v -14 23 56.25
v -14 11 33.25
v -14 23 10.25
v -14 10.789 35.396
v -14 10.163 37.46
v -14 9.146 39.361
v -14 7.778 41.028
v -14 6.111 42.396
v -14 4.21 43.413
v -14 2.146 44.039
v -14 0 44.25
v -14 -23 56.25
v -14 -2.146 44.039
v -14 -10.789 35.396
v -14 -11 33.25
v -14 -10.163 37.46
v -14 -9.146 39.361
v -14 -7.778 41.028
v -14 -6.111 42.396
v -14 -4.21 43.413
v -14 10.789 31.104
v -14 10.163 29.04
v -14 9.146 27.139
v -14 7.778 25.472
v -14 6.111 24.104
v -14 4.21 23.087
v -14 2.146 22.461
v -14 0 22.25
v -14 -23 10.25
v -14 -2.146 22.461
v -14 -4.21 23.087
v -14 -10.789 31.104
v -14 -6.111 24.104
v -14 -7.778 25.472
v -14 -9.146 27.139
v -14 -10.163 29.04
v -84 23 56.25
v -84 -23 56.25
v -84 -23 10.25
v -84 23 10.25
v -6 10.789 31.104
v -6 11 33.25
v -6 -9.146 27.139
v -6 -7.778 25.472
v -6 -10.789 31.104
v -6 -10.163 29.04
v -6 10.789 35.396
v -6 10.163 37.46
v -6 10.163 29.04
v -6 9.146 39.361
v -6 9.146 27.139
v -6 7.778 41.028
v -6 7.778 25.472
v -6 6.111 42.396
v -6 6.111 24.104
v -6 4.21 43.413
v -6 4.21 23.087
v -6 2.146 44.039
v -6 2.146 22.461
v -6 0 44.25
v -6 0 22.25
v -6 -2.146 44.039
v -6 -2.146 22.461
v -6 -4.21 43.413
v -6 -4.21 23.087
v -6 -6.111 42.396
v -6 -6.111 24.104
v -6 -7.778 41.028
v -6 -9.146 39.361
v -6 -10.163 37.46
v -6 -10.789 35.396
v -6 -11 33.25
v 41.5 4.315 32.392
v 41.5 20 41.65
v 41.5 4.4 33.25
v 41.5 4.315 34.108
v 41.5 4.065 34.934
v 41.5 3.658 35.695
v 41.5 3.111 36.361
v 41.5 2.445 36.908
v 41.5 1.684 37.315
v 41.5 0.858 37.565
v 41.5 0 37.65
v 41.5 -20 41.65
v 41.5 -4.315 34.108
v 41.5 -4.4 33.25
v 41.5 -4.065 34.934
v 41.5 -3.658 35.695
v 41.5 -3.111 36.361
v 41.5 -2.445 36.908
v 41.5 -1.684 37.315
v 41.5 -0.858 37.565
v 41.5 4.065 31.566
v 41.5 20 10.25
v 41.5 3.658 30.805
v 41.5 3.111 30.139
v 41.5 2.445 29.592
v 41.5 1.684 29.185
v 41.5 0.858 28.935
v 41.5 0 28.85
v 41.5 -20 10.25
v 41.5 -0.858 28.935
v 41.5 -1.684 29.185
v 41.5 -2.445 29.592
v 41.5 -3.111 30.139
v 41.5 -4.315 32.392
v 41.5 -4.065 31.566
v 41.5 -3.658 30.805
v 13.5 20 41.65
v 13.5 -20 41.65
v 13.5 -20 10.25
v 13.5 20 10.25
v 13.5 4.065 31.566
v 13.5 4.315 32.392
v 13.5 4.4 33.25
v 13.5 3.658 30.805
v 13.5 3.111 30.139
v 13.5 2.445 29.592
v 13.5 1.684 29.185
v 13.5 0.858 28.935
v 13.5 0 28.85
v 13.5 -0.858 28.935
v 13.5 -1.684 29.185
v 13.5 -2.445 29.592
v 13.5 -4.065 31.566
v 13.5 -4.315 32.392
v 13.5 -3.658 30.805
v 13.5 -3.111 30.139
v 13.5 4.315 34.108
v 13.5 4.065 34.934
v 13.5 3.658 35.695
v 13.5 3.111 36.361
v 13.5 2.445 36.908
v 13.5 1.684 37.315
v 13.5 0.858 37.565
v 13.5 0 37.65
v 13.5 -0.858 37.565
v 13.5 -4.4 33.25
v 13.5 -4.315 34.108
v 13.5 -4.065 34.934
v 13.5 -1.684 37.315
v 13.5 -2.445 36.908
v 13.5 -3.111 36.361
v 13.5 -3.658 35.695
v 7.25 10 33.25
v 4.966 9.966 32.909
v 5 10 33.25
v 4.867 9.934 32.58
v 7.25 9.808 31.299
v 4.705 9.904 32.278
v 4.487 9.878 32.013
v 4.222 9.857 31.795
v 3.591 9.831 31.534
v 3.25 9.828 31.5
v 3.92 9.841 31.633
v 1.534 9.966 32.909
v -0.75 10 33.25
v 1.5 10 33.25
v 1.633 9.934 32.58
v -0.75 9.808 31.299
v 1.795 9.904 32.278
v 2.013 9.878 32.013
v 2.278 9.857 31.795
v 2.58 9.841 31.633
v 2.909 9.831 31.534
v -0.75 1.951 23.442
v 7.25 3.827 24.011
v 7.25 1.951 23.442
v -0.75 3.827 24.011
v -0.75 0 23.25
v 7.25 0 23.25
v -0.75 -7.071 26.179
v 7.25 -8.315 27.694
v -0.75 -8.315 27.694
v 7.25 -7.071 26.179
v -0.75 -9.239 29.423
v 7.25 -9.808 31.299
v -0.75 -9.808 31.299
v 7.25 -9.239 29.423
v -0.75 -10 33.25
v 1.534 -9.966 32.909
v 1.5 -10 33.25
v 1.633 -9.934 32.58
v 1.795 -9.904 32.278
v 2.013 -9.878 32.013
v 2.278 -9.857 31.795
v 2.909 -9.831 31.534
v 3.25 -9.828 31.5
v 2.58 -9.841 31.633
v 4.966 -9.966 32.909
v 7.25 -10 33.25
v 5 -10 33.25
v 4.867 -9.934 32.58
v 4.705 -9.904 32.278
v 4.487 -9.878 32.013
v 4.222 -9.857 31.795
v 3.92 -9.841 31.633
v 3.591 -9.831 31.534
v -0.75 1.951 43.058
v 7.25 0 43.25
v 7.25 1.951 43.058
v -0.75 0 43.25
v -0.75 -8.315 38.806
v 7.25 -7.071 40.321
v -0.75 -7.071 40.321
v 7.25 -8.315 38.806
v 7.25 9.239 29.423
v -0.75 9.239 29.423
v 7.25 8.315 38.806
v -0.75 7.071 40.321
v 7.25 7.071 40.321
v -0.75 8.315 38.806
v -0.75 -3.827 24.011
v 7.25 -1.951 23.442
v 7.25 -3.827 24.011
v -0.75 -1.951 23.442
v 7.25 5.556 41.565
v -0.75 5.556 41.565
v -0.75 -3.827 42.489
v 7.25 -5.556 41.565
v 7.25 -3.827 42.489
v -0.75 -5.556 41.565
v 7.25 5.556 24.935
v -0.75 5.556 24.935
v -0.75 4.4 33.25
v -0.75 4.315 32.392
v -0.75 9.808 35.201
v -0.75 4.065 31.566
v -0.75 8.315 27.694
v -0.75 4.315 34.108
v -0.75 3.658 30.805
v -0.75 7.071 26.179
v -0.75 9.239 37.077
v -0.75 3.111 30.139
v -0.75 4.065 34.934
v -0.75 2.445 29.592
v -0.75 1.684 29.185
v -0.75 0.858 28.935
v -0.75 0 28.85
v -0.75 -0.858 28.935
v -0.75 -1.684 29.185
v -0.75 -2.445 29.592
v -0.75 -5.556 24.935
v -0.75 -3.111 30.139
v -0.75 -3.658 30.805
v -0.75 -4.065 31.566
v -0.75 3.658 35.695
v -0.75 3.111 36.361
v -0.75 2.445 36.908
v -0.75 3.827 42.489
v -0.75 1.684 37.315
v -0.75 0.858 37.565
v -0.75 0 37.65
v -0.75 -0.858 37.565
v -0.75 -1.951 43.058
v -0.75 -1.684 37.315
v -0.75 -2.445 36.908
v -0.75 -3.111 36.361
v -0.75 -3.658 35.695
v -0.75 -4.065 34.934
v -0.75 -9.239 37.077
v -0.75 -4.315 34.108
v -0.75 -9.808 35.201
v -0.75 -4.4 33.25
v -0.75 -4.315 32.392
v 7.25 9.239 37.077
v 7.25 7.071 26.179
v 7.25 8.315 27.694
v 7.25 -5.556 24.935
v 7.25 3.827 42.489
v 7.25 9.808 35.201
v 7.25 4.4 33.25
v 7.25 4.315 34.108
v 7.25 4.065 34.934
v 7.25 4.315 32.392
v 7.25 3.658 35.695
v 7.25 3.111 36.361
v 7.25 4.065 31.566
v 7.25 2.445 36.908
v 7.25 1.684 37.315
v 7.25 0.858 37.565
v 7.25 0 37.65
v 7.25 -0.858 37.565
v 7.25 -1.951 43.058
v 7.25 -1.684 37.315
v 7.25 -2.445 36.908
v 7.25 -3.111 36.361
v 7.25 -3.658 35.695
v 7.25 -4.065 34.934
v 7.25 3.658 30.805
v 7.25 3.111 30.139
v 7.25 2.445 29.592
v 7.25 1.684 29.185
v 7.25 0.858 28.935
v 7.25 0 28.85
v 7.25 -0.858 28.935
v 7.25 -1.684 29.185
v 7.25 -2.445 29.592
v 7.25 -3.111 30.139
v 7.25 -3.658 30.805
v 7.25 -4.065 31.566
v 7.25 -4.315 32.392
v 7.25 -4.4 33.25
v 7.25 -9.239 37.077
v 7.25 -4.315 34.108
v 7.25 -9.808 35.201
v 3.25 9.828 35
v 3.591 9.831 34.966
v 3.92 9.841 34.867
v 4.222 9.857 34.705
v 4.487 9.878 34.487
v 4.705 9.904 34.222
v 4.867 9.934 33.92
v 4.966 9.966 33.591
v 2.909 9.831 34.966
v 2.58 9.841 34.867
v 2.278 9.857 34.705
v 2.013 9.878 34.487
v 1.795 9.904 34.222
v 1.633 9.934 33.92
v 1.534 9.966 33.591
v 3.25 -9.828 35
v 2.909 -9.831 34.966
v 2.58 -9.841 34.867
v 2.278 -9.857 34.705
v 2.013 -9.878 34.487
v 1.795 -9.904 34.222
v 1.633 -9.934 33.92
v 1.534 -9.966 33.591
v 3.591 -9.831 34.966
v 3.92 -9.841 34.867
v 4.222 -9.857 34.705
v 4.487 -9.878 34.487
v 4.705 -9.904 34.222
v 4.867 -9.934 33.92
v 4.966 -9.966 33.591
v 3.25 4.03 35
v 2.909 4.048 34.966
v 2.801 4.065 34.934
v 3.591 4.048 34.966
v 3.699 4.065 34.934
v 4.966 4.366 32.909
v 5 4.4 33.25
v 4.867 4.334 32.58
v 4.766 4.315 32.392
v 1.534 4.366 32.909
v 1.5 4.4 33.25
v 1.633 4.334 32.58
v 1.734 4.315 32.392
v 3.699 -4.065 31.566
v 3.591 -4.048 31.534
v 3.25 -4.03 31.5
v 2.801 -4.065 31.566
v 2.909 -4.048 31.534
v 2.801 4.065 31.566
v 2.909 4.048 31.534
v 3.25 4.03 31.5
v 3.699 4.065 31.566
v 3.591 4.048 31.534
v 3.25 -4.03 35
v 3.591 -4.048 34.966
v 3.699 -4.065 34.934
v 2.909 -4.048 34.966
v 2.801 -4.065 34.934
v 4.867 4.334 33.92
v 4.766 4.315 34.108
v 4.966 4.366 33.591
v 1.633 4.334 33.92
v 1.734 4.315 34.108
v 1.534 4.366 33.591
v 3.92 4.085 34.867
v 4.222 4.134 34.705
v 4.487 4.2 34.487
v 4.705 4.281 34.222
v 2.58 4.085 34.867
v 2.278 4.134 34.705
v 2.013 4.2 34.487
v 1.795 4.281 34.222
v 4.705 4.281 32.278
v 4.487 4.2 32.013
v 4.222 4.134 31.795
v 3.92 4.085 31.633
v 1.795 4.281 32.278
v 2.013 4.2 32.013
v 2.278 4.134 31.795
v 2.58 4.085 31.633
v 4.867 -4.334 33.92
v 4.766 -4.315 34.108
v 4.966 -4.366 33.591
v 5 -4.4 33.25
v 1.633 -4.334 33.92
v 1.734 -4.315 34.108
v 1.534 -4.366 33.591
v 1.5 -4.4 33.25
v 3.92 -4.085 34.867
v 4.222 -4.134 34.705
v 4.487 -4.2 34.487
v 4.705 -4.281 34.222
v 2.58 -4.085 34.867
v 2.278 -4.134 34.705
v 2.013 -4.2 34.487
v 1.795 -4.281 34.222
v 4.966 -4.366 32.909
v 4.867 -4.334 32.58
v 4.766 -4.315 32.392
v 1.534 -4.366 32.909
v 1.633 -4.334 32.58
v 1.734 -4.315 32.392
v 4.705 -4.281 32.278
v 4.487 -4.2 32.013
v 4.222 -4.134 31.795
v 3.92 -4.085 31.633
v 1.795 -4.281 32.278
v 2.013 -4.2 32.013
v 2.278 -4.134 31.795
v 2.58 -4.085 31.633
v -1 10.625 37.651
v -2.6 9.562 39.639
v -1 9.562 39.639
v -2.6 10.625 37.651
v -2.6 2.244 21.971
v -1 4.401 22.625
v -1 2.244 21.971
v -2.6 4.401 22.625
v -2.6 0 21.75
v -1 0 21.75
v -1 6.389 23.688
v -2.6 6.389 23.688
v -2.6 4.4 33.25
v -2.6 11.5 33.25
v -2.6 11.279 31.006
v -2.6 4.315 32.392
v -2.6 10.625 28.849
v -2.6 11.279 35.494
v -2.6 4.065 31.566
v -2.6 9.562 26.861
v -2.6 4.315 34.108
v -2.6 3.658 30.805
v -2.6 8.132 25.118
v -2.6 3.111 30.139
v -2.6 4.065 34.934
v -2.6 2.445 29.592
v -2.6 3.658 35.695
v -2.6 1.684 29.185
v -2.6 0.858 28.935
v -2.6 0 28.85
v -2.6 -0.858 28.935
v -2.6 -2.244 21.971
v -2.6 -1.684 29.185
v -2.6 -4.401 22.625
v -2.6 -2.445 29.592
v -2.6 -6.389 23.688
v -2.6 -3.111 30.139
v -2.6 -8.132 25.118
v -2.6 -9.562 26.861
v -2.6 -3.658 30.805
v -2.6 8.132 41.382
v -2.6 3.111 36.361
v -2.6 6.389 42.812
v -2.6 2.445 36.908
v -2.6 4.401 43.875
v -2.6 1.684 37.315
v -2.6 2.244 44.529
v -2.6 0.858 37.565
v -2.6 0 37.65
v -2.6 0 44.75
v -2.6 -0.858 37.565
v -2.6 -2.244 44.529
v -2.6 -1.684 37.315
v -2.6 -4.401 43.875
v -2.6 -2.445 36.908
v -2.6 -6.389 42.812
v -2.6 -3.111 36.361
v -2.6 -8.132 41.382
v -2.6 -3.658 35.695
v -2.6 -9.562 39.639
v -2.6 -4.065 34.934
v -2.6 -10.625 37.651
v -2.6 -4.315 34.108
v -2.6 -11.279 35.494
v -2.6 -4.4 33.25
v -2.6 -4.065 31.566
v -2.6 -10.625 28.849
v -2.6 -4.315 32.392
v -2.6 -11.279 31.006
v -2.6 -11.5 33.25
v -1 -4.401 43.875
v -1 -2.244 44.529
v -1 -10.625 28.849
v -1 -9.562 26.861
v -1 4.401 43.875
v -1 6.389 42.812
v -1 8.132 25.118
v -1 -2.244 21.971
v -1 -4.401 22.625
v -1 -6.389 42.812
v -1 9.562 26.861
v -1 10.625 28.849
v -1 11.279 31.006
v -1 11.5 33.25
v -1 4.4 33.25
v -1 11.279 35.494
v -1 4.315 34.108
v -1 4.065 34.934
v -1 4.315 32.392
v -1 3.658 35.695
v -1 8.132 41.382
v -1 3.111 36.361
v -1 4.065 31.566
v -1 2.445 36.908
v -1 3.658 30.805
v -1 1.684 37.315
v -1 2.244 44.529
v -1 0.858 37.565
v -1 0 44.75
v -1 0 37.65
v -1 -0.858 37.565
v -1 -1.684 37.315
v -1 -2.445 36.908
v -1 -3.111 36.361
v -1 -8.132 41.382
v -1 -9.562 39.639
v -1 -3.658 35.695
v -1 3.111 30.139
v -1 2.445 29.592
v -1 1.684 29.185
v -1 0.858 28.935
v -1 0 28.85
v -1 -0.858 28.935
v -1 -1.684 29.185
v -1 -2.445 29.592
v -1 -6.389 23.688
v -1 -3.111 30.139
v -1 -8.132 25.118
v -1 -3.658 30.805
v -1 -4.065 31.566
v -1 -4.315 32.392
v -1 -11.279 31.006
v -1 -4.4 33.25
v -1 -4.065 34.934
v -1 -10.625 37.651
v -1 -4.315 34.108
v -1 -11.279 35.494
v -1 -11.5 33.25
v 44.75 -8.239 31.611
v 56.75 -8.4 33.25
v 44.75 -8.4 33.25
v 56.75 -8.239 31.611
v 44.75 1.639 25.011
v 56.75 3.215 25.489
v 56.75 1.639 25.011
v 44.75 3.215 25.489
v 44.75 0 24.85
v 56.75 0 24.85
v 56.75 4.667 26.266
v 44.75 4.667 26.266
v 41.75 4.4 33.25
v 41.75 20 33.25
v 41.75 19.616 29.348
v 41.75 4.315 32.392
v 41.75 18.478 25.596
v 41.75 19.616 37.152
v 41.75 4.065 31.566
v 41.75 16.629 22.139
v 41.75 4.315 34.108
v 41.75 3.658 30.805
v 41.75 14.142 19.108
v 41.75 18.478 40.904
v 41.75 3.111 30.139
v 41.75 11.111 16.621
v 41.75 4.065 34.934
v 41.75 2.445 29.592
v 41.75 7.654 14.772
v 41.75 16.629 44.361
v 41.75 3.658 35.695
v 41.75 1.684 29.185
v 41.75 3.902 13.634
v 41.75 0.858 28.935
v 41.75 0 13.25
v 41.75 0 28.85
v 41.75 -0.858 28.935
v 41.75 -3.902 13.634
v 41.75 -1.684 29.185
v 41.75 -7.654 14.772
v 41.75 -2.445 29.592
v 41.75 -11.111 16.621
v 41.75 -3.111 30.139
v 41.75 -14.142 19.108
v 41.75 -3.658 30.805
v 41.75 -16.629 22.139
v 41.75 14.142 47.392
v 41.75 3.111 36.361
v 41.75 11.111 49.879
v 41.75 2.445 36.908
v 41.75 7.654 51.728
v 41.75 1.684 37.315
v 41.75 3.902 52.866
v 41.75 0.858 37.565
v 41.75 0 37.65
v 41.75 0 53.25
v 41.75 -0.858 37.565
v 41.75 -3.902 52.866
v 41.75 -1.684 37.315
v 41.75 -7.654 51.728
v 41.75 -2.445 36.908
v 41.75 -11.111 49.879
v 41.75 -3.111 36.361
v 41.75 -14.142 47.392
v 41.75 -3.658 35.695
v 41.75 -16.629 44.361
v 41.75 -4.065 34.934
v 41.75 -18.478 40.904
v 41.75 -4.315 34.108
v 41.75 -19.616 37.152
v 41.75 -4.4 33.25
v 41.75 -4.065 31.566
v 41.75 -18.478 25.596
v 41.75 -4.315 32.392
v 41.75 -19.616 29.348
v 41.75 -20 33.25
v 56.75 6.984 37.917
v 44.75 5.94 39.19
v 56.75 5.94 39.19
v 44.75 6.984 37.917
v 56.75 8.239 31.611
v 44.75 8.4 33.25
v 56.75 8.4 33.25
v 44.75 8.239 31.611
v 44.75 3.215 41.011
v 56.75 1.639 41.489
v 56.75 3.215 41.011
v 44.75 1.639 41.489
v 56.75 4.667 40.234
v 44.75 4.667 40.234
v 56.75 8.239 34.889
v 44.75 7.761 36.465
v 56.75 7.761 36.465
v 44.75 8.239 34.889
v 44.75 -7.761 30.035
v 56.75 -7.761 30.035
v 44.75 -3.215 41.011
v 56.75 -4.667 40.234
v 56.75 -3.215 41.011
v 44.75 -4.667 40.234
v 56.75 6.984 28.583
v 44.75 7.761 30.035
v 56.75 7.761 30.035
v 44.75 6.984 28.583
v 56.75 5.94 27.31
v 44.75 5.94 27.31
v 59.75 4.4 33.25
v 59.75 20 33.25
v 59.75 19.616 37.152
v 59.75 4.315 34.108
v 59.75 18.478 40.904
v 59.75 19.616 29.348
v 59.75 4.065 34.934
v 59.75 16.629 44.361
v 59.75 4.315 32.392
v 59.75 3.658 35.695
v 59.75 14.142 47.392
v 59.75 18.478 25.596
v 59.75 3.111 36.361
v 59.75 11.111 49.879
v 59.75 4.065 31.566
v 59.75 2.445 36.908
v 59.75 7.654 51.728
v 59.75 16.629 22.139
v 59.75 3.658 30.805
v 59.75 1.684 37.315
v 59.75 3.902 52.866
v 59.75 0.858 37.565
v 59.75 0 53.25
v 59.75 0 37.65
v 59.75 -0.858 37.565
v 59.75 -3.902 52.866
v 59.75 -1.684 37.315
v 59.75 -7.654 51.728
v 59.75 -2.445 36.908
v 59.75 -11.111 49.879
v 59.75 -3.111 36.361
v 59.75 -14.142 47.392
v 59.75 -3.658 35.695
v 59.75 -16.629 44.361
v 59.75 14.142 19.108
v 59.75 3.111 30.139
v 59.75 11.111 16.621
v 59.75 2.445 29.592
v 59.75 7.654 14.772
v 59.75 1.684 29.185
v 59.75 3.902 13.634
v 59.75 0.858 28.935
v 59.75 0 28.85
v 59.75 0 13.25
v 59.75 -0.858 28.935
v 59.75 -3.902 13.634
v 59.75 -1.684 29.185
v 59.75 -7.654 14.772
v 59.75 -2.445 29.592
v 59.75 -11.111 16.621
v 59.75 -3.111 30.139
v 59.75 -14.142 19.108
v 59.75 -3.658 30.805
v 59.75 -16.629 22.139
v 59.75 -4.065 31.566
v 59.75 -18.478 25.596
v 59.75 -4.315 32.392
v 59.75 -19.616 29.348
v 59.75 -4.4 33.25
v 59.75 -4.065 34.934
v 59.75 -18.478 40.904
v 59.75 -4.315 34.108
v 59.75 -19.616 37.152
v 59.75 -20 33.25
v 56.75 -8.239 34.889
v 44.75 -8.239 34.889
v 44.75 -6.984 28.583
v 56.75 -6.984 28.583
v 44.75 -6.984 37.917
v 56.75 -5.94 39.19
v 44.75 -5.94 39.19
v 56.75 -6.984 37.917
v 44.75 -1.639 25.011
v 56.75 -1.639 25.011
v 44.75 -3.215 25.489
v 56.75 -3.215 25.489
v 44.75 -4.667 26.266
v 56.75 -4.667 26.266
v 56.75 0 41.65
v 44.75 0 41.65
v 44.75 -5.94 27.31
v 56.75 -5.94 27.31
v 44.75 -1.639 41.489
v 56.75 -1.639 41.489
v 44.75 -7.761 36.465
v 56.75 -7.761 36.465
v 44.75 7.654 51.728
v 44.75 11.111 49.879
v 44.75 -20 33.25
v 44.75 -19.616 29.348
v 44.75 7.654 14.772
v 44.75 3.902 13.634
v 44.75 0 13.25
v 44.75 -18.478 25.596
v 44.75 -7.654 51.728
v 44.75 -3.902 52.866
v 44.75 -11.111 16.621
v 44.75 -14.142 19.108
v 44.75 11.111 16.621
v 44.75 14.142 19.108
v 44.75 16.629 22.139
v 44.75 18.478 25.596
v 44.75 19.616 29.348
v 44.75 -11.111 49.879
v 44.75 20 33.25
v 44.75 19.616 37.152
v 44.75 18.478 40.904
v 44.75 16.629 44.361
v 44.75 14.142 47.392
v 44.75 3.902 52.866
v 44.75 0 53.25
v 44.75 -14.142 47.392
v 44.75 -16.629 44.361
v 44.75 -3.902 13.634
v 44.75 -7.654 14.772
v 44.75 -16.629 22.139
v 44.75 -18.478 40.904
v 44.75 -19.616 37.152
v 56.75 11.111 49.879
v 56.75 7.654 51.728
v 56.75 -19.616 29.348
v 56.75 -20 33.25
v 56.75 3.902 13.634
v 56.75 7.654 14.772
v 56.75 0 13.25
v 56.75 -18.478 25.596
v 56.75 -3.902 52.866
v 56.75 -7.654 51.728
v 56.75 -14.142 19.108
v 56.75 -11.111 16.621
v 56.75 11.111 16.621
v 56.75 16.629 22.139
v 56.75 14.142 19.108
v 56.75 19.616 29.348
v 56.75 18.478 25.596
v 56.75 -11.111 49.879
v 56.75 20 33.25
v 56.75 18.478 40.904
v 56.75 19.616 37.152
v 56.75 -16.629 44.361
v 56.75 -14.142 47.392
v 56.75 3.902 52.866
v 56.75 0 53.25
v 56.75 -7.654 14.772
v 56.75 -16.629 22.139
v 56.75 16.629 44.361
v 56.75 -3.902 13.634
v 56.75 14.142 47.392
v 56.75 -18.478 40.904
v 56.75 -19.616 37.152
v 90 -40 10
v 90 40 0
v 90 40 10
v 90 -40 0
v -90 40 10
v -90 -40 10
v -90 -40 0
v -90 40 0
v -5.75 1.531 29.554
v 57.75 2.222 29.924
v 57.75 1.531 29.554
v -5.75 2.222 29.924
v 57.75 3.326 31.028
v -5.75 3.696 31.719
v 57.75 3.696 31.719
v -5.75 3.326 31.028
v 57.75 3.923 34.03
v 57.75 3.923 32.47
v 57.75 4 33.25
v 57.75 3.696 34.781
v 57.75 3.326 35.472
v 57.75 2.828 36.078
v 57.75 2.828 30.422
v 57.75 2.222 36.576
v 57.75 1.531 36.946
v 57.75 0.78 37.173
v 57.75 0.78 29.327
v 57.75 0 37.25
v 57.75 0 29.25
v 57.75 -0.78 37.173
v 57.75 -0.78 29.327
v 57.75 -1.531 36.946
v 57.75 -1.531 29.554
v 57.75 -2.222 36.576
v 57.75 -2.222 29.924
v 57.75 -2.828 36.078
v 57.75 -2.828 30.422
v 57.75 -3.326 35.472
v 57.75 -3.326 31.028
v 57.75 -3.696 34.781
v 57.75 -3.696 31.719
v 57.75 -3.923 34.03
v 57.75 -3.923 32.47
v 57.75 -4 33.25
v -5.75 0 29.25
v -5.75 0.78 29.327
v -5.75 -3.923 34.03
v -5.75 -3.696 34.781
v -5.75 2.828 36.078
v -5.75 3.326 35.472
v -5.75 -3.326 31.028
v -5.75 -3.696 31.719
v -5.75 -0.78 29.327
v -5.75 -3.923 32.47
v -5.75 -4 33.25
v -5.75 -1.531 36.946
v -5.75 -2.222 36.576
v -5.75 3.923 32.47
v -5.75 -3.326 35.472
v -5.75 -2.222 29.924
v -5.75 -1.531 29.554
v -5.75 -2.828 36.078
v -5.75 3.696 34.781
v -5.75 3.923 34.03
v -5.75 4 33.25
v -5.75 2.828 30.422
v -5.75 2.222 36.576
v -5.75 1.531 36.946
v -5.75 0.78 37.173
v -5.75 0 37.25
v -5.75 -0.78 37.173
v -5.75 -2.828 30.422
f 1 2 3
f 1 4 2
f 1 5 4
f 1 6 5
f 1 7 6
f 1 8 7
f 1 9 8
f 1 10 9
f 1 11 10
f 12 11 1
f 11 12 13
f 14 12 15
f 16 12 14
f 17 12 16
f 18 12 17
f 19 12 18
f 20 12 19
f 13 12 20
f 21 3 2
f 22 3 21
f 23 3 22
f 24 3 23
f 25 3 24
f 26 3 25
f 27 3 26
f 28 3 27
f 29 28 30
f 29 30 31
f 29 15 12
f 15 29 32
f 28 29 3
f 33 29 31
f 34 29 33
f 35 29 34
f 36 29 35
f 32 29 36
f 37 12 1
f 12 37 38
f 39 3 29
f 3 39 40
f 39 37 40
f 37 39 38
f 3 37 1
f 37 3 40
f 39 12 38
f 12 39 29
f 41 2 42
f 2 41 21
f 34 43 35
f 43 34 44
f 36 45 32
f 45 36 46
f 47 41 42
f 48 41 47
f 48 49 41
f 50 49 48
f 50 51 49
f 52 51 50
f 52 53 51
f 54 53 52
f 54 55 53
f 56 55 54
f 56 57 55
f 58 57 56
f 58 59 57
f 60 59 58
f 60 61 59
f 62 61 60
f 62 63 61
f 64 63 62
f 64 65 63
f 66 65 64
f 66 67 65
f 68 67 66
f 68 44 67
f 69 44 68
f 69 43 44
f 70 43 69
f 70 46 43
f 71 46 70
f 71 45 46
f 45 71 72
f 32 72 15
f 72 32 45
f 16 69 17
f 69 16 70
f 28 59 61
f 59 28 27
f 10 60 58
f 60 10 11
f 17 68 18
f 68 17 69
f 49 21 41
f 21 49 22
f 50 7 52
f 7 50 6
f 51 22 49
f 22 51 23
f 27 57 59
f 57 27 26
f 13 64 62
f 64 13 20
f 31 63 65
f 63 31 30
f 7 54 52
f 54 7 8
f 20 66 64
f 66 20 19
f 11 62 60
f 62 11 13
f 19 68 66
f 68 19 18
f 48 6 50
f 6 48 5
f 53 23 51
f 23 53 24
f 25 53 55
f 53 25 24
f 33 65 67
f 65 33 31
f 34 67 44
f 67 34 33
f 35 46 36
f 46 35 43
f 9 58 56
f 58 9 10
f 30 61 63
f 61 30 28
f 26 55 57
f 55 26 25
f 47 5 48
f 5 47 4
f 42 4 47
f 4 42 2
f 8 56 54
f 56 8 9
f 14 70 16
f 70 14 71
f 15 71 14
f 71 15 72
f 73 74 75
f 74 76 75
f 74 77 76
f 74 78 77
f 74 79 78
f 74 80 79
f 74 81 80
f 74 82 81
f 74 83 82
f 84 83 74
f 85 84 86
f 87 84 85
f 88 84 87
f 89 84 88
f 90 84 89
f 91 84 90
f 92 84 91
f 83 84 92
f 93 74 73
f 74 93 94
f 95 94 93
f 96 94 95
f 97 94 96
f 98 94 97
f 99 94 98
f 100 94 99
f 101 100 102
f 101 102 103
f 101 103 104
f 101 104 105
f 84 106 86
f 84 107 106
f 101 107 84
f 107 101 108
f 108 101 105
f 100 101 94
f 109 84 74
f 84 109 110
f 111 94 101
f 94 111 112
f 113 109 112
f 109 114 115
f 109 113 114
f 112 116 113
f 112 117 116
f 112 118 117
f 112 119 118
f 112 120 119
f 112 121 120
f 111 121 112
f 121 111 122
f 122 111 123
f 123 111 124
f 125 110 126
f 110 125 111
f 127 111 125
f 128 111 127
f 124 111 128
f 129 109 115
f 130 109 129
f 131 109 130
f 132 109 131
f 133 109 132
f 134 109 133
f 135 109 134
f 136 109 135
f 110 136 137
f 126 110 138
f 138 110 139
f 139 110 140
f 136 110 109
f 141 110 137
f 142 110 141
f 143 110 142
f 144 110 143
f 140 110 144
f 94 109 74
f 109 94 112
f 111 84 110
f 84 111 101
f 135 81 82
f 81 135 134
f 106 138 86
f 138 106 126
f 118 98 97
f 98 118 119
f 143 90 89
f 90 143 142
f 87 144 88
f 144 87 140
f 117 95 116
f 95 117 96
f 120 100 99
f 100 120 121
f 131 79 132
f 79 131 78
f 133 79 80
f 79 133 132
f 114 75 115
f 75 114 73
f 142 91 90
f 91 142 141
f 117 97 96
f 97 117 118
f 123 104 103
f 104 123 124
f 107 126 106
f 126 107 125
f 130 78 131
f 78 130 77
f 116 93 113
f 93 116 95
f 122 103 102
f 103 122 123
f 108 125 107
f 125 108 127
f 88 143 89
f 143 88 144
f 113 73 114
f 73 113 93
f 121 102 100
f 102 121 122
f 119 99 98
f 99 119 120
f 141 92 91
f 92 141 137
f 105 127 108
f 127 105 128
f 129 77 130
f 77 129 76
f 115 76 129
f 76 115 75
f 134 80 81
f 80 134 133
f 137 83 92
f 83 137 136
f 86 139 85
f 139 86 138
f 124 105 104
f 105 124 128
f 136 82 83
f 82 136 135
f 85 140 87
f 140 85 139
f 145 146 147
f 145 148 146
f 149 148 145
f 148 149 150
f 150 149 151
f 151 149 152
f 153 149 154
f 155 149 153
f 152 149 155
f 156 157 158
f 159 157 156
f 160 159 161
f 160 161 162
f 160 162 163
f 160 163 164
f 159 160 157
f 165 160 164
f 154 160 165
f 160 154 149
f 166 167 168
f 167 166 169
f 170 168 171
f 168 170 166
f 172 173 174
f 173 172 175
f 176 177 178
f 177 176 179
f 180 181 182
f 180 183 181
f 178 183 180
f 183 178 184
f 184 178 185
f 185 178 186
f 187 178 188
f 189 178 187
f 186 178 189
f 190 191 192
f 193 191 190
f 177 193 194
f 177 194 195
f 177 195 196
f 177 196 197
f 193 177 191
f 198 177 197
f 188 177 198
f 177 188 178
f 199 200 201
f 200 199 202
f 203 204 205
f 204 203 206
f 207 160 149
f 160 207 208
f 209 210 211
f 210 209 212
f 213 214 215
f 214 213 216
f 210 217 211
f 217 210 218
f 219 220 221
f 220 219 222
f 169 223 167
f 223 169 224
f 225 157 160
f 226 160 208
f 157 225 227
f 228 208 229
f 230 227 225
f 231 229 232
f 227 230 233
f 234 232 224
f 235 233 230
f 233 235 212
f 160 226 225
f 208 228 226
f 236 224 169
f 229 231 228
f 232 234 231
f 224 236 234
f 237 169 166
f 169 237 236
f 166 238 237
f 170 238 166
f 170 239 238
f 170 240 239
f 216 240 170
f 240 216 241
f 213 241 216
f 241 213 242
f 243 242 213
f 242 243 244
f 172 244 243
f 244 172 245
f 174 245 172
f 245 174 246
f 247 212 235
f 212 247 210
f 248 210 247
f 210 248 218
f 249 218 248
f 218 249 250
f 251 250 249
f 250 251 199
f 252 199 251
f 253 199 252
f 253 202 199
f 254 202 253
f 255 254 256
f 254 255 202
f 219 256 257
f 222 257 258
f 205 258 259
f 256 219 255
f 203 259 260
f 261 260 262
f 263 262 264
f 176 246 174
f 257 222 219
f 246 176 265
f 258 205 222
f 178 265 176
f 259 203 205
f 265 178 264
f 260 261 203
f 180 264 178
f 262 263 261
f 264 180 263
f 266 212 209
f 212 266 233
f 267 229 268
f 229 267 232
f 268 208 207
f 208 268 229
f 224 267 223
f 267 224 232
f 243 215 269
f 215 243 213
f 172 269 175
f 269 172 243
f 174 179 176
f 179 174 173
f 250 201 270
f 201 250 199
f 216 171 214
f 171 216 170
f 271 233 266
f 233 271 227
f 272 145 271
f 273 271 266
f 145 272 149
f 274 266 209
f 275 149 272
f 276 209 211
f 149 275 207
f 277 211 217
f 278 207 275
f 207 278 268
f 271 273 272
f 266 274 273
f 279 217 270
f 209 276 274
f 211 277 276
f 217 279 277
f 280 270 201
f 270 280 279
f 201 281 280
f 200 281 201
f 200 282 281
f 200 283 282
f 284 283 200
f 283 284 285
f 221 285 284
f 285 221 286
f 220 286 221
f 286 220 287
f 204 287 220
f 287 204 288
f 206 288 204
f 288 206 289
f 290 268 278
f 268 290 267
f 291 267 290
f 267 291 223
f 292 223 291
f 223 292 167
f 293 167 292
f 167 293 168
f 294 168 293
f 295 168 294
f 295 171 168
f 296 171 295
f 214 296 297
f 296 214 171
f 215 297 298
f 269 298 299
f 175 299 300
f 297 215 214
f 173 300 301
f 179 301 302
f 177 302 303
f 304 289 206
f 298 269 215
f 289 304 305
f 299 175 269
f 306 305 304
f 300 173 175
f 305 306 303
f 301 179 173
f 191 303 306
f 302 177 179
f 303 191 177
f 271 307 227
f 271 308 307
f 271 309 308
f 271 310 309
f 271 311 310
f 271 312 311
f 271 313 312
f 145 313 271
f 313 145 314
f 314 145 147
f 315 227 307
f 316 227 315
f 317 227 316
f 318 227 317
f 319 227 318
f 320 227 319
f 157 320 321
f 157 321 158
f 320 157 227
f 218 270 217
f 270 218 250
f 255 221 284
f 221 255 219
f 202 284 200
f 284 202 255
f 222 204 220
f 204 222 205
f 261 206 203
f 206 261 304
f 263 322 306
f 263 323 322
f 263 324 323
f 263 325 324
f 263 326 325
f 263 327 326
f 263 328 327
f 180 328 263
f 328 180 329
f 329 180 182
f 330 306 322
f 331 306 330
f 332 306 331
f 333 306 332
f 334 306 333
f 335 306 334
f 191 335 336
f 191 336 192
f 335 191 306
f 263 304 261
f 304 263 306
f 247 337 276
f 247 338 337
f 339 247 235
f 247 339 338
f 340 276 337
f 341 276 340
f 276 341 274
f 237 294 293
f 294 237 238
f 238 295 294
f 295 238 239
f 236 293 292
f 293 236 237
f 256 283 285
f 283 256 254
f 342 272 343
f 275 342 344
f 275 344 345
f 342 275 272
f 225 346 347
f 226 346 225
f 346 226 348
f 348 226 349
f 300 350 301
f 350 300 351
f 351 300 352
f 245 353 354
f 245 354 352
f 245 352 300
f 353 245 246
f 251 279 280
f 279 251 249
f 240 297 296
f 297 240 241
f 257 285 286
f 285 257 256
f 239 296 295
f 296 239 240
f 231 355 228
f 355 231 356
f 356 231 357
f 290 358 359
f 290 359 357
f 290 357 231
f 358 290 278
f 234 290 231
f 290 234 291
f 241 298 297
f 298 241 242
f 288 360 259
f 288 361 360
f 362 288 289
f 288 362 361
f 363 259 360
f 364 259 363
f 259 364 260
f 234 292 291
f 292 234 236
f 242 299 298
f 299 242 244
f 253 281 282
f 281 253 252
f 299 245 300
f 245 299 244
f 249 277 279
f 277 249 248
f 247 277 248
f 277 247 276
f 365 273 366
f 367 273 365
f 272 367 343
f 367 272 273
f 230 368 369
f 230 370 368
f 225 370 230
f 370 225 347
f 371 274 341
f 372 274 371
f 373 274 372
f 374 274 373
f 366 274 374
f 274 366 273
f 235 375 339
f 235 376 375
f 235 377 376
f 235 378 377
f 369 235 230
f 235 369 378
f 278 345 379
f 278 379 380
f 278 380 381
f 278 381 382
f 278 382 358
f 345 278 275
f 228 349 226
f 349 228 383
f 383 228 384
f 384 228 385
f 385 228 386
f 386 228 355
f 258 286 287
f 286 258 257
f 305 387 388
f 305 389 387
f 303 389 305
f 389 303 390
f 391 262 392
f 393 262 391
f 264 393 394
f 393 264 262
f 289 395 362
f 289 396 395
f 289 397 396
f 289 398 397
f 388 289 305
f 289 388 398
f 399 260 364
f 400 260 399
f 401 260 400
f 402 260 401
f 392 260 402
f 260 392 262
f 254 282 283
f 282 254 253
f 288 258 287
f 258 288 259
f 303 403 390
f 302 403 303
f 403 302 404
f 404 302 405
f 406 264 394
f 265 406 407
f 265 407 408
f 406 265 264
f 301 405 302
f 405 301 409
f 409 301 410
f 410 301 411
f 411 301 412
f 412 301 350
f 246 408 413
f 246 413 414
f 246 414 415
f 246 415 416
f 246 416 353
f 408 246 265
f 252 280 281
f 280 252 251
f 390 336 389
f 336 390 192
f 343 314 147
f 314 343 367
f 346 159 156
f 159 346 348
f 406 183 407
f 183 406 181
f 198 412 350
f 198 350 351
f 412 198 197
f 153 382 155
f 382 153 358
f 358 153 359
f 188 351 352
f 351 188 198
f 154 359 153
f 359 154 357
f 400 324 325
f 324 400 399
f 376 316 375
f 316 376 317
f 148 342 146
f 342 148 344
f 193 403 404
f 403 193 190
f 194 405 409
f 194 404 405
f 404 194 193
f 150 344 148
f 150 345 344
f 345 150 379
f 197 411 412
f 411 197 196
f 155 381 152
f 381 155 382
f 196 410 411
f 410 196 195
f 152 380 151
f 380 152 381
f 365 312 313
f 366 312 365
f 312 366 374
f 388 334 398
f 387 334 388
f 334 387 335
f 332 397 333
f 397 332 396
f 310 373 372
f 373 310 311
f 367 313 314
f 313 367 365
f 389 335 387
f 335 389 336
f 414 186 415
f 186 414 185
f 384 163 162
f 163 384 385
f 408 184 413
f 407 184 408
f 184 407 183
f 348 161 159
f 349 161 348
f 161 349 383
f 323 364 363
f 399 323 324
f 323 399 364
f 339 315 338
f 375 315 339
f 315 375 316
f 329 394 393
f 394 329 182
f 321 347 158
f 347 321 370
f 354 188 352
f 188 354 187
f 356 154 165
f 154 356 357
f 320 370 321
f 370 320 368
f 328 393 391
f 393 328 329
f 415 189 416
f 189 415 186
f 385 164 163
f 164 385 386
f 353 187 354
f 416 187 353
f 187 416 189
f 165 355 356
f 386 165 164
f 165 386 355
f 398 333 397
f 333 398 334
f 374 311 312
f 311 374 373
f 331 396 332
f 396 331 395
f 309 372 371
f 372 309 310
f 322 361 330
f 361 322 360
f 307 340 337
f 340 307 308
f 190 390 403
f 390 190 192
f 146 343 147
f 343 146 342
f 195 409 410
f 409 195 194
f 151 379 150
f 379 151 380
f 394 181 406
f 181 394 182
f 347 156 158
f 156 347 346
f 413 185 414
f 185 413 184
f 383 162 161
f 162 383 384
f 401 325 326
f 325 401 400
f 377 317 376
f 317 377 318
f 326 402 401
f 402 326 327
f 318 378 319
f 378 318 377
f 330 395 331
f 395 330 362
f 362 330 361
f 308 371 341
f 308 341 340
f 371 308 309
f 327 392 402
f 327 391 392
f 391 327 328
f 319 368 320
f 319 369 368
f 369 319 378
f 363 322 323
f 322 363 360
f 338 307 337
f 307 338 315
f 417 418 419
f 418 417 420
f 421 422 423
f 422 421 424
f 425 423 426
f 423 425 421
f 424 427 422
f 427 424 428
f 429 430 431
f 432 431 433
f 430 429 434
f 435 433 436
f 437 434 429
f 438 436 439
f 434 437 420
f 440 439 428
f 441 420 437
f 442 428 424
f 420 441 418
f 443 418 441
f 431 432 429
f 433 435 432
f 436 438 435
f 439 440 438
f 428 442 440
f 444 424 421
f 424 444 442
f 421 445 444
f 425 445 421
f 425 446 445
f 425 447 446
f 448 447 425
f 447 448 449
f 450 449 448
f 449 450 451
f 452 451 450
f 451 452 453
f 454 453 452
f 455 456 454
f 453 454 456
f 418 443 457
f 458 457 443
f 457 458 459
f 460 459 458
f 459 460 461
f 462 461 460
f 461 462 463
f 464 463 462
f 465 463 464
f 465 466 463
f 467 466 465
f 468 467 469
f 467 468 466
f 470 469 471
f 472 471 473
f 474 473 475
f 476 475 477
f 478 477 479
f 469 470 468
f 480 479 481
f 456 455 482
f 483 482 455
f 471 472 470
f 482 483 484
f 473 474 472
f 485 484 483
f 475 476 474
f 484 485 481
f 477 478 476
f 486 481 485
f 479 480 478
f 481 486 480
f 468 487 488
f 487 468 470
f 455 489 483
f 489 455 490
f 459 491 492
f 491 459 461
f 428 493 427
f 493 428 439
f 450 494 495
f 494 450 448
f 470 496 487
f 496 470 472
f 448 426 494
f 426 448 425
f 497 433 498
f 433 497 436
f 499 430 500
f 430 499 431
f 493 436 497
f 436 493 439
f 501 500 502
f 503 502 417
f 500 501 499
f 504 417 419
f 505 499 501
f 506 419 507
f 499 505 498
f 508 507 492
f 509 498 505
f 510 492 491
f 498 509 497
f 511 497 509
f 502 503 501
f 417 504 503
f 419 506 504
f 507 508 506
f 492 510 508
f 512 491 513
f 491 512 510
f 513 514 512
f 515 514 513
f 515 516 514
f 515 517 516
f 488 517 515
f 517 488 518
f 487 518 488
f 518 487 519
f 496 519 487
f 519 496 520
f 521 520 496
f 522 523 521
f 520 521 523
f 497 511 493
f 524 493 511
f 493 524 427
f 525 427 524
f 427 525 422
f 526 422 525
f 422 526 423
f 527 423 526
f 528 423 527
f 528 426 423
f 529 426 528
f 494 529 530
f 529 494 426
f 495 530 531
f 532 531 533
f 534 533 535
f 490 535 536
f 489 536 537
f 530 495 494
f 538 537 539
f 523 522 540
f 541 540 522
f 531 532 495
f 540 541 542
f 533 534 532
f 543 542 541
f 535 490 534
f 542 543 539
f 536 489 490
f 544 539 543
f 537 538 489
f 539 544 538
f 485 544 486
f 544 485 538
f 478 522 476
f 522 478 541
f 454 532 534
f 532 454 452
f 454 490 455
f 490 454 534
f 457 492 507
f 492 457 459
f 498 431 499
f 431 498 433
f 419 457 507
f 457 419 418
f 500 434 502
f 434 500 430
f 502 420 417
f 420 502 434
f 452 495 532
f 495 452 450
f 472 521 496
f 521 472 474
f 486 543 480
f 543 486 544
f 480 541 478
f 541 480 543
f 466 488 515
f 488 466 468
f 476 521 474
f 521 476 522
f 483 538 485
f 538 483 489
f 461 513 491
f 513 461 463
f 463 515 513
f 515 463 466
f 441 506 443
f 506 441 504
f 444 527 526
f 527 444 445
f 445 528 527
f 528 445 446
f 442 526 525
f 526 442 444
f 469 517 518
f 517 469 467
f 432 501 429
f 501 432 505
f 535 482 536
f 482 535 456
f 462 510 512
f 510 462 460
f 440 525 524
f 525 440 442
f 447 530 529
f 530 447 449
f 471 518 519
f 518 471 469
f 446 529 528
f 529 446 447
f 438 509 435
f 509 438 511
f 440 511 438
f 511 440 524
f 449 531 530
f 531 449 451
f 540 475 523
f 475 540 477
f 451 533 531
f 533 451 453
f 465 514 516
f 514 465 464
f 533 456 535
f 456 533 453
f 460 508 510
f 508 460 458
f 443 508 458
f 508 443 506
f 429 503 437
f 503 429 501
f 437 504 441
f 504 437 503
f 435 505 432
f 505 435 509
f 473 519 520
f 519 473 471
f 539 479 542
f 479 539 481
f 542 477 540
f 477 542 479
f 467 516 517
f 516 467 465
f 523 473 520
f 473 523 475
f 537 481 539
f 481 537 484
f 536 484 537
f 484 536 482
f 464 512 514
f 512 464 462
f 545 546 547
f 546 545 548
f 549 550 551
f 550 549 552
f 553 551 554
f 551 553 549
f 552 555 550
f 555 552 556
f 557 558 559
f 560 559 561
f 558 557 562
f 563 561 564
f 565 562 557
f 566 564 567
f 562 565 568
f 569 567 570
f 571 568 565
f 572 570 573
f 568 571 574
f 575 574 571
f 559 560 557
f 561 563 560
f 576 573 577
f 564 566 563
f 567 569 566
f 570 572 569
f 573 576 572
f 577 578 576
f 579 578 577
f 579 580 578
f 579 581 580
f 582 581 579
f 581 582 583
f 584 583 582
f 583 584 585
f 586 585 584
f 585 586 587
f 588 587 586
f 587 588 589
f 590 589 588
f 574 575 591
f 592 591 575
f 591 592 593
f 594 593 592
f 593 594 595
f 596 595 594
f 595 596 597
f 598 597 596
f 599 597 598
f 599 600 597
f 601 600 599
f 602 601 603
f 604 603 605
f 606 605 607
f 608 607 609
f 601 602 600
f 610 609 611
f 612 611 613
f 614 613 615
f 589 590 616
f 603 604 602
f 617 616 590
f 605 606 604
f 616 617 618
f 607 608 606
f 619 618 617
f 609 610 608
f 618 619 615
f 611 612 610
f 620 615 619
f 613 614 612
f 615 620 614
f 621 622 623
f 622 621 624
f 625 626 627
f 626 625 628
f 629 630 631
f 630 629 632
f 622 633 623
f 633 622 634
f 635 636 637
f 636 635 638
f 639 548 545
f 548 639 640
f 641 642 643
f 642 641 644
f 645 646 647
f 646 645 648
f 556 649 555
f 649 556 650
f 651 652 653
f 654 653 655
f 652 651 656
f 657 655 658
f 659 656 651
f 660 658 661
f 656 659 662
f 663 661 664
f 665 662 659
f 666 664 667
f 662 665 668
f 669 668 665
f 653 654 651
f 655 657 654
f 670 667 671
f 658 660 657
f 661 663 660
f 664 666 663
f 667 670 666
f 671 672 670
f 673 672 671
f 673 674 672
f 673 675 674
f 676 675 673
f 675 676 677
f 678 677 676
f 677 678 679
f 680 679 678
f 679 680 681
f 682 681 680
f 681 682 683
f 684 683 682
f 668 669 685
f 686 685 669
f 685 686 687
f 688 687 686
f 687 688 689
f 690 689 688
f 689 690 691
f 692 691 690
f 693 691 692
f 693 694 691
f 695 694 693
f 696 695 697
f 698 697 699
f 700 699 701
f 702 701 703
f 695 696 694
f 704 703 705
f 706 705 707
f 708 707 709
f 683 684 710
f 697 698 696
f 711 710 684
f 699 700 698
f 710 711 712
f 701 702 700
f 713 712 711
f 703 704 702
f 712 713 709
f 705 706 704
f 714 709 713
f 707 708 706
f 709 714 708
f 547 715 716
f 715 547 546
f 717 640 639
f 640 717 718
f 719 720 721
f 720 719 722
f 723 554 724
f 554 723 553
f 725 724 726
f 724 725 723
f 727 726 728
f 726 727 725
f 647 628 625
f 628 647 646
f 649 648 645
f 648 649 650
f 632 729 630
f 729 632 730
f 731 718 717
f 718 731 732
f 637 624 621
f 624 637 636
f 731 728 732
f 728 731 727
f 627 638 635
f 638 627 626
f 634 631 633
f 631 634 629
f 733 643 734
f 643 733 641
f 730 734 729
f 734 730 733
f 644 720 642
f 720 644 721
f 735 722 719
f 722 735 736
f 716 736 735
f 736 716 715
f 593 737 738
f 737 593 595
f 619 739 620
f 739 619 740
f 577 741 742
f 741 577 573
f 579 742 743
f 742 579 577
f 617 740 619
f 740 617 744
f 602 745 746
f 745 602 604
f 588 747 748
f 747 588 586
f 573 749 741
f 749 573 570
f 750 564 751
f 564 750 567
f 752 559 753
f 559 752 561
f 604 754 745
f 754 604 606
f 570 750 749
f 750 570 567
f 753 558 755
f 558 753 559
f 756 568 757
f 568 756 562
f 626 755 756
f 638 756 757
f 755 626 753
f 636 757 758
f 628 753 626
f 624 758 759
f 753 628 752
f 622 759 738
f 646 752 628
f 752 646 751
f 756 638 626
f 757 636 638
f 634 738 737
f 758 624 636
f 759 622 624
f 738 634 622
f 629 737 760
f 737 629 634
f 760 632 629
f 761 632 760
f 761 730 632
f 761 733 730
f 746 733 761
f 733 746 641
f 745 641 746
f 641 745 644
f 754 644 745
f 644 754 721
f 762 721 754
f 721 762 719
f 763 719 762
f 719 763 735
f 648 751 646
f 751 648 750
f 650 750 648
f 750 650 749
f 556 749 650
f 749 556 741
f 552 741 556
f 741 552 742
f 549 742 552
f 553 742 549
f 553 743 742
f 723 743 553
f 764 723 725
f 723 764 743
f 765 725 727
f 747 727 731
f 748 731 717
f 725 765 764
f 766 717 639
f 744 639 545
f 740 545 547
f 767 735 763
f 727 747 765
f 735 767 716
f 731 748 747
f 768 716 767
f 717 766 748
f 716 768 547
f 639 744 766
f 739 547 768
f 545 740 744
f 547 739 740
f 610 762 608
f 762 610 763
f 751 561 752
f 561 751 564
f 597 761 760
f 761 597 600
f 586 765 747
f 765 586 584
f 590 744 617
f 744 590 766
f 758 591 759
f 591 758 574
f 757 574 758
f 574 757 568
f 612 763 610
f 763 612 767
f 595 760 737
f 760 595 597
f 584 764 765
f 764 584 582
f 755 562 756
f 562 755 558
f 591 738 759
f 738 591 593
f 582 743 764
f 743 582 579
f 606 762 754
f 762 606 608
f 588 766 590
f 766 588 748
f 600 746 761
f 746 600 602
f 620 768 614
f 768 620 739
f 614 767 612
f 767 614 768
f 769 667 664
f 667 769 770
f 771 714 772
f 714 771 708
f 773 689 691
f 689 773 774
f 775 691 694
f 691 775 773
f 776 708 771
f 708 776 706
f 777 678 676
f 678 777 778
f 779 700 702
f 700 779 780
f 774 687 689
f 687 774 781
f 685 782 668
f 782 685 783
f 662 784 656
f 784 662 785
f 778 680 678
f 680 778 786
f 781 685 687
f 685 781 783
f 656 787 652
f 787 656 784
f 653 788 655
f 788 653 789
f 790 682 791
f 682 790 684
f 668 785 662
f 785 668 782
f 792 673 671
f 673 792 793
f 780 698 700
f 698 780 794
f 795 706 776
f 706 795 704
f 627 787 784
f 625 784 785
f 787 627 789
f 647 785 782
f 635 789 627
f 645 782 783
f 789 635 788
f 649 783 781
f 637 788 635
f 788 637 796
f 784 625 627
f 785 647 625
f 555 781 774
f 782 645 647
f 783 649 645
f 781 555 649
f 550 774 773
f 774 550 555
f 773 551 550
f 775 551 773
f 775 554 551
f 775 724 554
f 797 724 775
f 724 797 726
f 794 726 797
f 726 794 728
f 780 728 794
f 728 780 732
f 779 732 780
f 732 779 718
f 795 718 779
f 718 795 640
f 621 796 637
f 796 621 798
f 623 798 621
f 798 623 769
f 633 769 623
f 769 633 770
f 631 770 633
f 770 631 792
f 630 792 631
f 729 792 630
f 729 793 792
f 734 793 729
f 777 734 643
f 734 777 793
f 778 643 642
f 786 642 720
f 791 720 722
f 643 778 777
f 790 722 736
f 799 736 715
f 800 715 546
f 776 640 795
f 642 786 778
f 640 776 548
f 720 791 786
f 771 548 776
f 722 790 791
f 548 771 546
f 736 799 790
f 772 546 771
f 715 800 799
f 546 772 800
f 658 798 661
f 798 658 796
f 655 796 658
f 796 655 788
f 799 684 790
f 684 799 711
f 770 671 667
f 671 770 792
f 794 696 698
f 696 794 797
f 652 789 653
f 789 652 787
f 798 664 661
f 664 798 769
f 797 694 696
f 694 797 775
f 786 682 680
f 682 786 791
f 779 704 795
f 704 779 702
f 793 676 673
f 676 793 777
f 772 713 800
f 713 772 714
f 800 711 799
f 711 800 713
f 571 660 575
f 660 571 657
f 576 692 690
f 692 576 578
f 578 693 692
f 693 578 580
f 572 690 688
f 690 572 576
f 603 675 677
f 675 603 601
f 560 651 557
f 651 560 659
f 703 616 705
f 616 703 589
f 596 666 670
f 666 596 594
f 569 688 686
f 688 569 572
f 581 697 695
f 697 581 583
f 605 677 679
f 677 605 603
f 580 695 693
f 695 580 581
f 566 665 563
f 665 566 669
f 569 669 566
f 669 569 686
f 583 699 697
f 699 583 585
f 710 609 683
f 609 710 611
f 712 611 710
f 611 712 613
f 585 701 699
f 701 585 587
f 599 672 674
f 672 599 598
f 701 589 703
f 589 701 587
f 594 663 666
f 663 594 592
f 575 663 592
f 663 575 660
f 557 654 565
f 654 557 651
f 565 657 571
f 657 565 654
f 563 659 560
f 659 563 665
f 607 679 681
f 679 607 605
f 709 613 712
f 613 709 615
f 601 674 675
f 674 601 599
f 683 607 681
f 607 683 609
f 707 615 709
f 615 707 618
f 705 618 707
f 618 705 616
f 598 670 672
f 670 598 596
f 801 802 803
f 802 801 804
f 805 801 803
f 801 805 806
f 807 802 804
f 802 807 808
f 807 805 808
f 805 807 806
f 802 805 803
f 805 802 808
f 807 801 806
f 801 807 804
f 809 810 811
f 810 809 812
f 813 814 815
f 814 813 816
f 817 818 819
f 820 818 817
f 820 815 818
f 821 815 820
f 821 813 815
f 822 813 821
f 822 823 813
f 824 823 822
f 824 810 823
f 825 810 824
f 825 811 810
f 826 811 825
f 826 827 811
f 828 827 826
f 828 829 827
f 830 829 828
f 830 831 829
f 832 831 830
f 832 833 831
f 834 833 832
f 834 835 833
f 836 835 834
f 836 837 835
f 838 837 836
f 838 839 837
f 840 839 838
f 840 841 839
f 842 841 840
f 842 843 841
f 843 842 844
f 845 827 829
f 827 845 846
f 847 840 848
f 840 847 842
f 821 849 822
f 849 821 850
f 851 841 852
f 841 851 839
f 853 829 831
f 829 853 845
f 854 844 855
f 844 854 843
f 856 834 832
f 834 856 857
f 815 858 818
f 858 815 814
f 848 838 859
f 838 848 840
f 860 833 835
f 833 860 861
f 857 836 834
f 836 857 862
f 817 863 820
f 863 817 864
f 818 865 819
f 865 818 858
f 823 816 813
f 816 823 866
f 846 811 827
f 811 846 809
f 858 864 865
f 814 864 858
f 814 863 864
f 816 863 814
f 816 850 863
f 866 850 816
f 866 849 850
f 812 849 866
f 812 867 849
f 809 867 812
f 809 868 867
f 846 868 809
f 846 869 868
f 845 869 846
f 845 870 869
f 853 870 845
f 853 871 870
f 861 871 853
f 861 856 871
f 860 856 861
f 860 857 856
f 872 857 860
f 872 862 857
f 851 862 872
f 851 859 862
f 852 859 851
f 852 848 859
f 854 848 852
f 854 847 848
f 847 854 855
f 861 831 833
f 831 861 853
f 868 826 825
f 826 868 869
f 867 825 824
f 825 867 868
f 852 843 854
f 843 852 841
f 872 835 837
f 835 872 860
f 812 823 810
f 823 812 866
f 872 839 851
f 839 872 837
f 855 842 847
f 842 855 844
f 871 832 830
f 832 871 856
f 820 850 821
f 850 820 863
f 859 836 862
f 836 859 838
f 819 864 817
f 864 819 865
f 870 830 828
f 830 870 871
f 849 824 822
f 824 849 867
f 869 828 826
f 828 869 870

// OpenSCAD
$fn = 32;

// ------------------------------------------------------------------------
// Motor drive station: motor 70 x 46 mm, shaft d8, pulley d40
// Every part is its own module, assembly() places every instance.
// ------------------------------------------------------------------------

// --- part 1 ---
module station_bed() {
  difference() {
    translate([-90, -40, 0]) cube([180, 80, 10]);
  }
}

// --- part 2 ---
module drive_motor() {
  union() {
    translate([-35, -23, 0]) cube([70, 46, 46]);
    translate([39, 0, 23]) rotate([0, 90, 0]) cylinder(h = 8, d = 22, center = true);
  }
}

// --- part 3 ---
module pillow_block() {
  difference() {
    translate([-14, -20, 0]) cube([28, 40, 31.4]);
    translate([0, 0, 23]) rotate([0, 90, 0]) cylinder(h = 30, d = 8.8, center = true);
  }
}

// --- part 4 ---
module drive_shaft() {
  translate([0, 0, -31.75]) cylinder(h = 63.5, d = 8);
}

// --- part 5 ---
module shaft_collar() {
  difference() {
    cylinder(h = 8, d = 20);
    translate([0, 0, -1]) cylinder(h = 10, d = 8.8);
    translate([0, 0, 4]) rotate([90, 0, 0]) cylinder(h = 22, d = 3.5, center = true);
  }
}

// --- part 6 ---
module collar_washer() {
  difference() {
      translate([0, 0, 0]) cylinder(h = 1.6, d = 23);
      translate([0, 0, -1]) cylinder(h = 3.6, d = 8.8);
    }
}

// --- part 7 ---
module drive_pulley() {
  difference() {
    union() {
      cylinder(h = 18, d = 16.8);
      cylinder(h = 3, d = 40);
      translate([0, 0, 15]) cylinder(h = 3, d = 40);
    }
    translate([0, 0, -1]) cylinder(h = 20, d = 8.8);
  }
}

// --- assembly ---
module assembly() {
  color([0.80, 0.24, 0.20]) translate([0, 0, 0]) rotate([0, 0, 0]) station_bed();
  color([0.20, 0.45, 0.75]) translate([-49, 0, 10.25]) rotate([0, 0, 0]) drive_motor();
  color([0.25, 0.62, 0.32]) translate([27.5, 0, 10.25]) rotate([0, 0, 0]) pillow_block();
  color([0.92, 0.70, 0.18]) translate([26, 0, 33.25]) rotate([0, 90, 0]) drive_shaft();
  color([0.58, 0.35, 0.70]) translate([-0.75, 0, 33.25]) rotate([0, 90, 0]) shaft_collar();
  color([0.16, 0.66, 0.66]) translate([-2.6, 0, 33.25]) rotate([0, 90, 0]) collar_washer();
  color([0.85, 0.48, 0.18]) translate([41.75, 0, 33.25]) rotate([0, 90, 0]) drive_pulley();
}

assembly();
